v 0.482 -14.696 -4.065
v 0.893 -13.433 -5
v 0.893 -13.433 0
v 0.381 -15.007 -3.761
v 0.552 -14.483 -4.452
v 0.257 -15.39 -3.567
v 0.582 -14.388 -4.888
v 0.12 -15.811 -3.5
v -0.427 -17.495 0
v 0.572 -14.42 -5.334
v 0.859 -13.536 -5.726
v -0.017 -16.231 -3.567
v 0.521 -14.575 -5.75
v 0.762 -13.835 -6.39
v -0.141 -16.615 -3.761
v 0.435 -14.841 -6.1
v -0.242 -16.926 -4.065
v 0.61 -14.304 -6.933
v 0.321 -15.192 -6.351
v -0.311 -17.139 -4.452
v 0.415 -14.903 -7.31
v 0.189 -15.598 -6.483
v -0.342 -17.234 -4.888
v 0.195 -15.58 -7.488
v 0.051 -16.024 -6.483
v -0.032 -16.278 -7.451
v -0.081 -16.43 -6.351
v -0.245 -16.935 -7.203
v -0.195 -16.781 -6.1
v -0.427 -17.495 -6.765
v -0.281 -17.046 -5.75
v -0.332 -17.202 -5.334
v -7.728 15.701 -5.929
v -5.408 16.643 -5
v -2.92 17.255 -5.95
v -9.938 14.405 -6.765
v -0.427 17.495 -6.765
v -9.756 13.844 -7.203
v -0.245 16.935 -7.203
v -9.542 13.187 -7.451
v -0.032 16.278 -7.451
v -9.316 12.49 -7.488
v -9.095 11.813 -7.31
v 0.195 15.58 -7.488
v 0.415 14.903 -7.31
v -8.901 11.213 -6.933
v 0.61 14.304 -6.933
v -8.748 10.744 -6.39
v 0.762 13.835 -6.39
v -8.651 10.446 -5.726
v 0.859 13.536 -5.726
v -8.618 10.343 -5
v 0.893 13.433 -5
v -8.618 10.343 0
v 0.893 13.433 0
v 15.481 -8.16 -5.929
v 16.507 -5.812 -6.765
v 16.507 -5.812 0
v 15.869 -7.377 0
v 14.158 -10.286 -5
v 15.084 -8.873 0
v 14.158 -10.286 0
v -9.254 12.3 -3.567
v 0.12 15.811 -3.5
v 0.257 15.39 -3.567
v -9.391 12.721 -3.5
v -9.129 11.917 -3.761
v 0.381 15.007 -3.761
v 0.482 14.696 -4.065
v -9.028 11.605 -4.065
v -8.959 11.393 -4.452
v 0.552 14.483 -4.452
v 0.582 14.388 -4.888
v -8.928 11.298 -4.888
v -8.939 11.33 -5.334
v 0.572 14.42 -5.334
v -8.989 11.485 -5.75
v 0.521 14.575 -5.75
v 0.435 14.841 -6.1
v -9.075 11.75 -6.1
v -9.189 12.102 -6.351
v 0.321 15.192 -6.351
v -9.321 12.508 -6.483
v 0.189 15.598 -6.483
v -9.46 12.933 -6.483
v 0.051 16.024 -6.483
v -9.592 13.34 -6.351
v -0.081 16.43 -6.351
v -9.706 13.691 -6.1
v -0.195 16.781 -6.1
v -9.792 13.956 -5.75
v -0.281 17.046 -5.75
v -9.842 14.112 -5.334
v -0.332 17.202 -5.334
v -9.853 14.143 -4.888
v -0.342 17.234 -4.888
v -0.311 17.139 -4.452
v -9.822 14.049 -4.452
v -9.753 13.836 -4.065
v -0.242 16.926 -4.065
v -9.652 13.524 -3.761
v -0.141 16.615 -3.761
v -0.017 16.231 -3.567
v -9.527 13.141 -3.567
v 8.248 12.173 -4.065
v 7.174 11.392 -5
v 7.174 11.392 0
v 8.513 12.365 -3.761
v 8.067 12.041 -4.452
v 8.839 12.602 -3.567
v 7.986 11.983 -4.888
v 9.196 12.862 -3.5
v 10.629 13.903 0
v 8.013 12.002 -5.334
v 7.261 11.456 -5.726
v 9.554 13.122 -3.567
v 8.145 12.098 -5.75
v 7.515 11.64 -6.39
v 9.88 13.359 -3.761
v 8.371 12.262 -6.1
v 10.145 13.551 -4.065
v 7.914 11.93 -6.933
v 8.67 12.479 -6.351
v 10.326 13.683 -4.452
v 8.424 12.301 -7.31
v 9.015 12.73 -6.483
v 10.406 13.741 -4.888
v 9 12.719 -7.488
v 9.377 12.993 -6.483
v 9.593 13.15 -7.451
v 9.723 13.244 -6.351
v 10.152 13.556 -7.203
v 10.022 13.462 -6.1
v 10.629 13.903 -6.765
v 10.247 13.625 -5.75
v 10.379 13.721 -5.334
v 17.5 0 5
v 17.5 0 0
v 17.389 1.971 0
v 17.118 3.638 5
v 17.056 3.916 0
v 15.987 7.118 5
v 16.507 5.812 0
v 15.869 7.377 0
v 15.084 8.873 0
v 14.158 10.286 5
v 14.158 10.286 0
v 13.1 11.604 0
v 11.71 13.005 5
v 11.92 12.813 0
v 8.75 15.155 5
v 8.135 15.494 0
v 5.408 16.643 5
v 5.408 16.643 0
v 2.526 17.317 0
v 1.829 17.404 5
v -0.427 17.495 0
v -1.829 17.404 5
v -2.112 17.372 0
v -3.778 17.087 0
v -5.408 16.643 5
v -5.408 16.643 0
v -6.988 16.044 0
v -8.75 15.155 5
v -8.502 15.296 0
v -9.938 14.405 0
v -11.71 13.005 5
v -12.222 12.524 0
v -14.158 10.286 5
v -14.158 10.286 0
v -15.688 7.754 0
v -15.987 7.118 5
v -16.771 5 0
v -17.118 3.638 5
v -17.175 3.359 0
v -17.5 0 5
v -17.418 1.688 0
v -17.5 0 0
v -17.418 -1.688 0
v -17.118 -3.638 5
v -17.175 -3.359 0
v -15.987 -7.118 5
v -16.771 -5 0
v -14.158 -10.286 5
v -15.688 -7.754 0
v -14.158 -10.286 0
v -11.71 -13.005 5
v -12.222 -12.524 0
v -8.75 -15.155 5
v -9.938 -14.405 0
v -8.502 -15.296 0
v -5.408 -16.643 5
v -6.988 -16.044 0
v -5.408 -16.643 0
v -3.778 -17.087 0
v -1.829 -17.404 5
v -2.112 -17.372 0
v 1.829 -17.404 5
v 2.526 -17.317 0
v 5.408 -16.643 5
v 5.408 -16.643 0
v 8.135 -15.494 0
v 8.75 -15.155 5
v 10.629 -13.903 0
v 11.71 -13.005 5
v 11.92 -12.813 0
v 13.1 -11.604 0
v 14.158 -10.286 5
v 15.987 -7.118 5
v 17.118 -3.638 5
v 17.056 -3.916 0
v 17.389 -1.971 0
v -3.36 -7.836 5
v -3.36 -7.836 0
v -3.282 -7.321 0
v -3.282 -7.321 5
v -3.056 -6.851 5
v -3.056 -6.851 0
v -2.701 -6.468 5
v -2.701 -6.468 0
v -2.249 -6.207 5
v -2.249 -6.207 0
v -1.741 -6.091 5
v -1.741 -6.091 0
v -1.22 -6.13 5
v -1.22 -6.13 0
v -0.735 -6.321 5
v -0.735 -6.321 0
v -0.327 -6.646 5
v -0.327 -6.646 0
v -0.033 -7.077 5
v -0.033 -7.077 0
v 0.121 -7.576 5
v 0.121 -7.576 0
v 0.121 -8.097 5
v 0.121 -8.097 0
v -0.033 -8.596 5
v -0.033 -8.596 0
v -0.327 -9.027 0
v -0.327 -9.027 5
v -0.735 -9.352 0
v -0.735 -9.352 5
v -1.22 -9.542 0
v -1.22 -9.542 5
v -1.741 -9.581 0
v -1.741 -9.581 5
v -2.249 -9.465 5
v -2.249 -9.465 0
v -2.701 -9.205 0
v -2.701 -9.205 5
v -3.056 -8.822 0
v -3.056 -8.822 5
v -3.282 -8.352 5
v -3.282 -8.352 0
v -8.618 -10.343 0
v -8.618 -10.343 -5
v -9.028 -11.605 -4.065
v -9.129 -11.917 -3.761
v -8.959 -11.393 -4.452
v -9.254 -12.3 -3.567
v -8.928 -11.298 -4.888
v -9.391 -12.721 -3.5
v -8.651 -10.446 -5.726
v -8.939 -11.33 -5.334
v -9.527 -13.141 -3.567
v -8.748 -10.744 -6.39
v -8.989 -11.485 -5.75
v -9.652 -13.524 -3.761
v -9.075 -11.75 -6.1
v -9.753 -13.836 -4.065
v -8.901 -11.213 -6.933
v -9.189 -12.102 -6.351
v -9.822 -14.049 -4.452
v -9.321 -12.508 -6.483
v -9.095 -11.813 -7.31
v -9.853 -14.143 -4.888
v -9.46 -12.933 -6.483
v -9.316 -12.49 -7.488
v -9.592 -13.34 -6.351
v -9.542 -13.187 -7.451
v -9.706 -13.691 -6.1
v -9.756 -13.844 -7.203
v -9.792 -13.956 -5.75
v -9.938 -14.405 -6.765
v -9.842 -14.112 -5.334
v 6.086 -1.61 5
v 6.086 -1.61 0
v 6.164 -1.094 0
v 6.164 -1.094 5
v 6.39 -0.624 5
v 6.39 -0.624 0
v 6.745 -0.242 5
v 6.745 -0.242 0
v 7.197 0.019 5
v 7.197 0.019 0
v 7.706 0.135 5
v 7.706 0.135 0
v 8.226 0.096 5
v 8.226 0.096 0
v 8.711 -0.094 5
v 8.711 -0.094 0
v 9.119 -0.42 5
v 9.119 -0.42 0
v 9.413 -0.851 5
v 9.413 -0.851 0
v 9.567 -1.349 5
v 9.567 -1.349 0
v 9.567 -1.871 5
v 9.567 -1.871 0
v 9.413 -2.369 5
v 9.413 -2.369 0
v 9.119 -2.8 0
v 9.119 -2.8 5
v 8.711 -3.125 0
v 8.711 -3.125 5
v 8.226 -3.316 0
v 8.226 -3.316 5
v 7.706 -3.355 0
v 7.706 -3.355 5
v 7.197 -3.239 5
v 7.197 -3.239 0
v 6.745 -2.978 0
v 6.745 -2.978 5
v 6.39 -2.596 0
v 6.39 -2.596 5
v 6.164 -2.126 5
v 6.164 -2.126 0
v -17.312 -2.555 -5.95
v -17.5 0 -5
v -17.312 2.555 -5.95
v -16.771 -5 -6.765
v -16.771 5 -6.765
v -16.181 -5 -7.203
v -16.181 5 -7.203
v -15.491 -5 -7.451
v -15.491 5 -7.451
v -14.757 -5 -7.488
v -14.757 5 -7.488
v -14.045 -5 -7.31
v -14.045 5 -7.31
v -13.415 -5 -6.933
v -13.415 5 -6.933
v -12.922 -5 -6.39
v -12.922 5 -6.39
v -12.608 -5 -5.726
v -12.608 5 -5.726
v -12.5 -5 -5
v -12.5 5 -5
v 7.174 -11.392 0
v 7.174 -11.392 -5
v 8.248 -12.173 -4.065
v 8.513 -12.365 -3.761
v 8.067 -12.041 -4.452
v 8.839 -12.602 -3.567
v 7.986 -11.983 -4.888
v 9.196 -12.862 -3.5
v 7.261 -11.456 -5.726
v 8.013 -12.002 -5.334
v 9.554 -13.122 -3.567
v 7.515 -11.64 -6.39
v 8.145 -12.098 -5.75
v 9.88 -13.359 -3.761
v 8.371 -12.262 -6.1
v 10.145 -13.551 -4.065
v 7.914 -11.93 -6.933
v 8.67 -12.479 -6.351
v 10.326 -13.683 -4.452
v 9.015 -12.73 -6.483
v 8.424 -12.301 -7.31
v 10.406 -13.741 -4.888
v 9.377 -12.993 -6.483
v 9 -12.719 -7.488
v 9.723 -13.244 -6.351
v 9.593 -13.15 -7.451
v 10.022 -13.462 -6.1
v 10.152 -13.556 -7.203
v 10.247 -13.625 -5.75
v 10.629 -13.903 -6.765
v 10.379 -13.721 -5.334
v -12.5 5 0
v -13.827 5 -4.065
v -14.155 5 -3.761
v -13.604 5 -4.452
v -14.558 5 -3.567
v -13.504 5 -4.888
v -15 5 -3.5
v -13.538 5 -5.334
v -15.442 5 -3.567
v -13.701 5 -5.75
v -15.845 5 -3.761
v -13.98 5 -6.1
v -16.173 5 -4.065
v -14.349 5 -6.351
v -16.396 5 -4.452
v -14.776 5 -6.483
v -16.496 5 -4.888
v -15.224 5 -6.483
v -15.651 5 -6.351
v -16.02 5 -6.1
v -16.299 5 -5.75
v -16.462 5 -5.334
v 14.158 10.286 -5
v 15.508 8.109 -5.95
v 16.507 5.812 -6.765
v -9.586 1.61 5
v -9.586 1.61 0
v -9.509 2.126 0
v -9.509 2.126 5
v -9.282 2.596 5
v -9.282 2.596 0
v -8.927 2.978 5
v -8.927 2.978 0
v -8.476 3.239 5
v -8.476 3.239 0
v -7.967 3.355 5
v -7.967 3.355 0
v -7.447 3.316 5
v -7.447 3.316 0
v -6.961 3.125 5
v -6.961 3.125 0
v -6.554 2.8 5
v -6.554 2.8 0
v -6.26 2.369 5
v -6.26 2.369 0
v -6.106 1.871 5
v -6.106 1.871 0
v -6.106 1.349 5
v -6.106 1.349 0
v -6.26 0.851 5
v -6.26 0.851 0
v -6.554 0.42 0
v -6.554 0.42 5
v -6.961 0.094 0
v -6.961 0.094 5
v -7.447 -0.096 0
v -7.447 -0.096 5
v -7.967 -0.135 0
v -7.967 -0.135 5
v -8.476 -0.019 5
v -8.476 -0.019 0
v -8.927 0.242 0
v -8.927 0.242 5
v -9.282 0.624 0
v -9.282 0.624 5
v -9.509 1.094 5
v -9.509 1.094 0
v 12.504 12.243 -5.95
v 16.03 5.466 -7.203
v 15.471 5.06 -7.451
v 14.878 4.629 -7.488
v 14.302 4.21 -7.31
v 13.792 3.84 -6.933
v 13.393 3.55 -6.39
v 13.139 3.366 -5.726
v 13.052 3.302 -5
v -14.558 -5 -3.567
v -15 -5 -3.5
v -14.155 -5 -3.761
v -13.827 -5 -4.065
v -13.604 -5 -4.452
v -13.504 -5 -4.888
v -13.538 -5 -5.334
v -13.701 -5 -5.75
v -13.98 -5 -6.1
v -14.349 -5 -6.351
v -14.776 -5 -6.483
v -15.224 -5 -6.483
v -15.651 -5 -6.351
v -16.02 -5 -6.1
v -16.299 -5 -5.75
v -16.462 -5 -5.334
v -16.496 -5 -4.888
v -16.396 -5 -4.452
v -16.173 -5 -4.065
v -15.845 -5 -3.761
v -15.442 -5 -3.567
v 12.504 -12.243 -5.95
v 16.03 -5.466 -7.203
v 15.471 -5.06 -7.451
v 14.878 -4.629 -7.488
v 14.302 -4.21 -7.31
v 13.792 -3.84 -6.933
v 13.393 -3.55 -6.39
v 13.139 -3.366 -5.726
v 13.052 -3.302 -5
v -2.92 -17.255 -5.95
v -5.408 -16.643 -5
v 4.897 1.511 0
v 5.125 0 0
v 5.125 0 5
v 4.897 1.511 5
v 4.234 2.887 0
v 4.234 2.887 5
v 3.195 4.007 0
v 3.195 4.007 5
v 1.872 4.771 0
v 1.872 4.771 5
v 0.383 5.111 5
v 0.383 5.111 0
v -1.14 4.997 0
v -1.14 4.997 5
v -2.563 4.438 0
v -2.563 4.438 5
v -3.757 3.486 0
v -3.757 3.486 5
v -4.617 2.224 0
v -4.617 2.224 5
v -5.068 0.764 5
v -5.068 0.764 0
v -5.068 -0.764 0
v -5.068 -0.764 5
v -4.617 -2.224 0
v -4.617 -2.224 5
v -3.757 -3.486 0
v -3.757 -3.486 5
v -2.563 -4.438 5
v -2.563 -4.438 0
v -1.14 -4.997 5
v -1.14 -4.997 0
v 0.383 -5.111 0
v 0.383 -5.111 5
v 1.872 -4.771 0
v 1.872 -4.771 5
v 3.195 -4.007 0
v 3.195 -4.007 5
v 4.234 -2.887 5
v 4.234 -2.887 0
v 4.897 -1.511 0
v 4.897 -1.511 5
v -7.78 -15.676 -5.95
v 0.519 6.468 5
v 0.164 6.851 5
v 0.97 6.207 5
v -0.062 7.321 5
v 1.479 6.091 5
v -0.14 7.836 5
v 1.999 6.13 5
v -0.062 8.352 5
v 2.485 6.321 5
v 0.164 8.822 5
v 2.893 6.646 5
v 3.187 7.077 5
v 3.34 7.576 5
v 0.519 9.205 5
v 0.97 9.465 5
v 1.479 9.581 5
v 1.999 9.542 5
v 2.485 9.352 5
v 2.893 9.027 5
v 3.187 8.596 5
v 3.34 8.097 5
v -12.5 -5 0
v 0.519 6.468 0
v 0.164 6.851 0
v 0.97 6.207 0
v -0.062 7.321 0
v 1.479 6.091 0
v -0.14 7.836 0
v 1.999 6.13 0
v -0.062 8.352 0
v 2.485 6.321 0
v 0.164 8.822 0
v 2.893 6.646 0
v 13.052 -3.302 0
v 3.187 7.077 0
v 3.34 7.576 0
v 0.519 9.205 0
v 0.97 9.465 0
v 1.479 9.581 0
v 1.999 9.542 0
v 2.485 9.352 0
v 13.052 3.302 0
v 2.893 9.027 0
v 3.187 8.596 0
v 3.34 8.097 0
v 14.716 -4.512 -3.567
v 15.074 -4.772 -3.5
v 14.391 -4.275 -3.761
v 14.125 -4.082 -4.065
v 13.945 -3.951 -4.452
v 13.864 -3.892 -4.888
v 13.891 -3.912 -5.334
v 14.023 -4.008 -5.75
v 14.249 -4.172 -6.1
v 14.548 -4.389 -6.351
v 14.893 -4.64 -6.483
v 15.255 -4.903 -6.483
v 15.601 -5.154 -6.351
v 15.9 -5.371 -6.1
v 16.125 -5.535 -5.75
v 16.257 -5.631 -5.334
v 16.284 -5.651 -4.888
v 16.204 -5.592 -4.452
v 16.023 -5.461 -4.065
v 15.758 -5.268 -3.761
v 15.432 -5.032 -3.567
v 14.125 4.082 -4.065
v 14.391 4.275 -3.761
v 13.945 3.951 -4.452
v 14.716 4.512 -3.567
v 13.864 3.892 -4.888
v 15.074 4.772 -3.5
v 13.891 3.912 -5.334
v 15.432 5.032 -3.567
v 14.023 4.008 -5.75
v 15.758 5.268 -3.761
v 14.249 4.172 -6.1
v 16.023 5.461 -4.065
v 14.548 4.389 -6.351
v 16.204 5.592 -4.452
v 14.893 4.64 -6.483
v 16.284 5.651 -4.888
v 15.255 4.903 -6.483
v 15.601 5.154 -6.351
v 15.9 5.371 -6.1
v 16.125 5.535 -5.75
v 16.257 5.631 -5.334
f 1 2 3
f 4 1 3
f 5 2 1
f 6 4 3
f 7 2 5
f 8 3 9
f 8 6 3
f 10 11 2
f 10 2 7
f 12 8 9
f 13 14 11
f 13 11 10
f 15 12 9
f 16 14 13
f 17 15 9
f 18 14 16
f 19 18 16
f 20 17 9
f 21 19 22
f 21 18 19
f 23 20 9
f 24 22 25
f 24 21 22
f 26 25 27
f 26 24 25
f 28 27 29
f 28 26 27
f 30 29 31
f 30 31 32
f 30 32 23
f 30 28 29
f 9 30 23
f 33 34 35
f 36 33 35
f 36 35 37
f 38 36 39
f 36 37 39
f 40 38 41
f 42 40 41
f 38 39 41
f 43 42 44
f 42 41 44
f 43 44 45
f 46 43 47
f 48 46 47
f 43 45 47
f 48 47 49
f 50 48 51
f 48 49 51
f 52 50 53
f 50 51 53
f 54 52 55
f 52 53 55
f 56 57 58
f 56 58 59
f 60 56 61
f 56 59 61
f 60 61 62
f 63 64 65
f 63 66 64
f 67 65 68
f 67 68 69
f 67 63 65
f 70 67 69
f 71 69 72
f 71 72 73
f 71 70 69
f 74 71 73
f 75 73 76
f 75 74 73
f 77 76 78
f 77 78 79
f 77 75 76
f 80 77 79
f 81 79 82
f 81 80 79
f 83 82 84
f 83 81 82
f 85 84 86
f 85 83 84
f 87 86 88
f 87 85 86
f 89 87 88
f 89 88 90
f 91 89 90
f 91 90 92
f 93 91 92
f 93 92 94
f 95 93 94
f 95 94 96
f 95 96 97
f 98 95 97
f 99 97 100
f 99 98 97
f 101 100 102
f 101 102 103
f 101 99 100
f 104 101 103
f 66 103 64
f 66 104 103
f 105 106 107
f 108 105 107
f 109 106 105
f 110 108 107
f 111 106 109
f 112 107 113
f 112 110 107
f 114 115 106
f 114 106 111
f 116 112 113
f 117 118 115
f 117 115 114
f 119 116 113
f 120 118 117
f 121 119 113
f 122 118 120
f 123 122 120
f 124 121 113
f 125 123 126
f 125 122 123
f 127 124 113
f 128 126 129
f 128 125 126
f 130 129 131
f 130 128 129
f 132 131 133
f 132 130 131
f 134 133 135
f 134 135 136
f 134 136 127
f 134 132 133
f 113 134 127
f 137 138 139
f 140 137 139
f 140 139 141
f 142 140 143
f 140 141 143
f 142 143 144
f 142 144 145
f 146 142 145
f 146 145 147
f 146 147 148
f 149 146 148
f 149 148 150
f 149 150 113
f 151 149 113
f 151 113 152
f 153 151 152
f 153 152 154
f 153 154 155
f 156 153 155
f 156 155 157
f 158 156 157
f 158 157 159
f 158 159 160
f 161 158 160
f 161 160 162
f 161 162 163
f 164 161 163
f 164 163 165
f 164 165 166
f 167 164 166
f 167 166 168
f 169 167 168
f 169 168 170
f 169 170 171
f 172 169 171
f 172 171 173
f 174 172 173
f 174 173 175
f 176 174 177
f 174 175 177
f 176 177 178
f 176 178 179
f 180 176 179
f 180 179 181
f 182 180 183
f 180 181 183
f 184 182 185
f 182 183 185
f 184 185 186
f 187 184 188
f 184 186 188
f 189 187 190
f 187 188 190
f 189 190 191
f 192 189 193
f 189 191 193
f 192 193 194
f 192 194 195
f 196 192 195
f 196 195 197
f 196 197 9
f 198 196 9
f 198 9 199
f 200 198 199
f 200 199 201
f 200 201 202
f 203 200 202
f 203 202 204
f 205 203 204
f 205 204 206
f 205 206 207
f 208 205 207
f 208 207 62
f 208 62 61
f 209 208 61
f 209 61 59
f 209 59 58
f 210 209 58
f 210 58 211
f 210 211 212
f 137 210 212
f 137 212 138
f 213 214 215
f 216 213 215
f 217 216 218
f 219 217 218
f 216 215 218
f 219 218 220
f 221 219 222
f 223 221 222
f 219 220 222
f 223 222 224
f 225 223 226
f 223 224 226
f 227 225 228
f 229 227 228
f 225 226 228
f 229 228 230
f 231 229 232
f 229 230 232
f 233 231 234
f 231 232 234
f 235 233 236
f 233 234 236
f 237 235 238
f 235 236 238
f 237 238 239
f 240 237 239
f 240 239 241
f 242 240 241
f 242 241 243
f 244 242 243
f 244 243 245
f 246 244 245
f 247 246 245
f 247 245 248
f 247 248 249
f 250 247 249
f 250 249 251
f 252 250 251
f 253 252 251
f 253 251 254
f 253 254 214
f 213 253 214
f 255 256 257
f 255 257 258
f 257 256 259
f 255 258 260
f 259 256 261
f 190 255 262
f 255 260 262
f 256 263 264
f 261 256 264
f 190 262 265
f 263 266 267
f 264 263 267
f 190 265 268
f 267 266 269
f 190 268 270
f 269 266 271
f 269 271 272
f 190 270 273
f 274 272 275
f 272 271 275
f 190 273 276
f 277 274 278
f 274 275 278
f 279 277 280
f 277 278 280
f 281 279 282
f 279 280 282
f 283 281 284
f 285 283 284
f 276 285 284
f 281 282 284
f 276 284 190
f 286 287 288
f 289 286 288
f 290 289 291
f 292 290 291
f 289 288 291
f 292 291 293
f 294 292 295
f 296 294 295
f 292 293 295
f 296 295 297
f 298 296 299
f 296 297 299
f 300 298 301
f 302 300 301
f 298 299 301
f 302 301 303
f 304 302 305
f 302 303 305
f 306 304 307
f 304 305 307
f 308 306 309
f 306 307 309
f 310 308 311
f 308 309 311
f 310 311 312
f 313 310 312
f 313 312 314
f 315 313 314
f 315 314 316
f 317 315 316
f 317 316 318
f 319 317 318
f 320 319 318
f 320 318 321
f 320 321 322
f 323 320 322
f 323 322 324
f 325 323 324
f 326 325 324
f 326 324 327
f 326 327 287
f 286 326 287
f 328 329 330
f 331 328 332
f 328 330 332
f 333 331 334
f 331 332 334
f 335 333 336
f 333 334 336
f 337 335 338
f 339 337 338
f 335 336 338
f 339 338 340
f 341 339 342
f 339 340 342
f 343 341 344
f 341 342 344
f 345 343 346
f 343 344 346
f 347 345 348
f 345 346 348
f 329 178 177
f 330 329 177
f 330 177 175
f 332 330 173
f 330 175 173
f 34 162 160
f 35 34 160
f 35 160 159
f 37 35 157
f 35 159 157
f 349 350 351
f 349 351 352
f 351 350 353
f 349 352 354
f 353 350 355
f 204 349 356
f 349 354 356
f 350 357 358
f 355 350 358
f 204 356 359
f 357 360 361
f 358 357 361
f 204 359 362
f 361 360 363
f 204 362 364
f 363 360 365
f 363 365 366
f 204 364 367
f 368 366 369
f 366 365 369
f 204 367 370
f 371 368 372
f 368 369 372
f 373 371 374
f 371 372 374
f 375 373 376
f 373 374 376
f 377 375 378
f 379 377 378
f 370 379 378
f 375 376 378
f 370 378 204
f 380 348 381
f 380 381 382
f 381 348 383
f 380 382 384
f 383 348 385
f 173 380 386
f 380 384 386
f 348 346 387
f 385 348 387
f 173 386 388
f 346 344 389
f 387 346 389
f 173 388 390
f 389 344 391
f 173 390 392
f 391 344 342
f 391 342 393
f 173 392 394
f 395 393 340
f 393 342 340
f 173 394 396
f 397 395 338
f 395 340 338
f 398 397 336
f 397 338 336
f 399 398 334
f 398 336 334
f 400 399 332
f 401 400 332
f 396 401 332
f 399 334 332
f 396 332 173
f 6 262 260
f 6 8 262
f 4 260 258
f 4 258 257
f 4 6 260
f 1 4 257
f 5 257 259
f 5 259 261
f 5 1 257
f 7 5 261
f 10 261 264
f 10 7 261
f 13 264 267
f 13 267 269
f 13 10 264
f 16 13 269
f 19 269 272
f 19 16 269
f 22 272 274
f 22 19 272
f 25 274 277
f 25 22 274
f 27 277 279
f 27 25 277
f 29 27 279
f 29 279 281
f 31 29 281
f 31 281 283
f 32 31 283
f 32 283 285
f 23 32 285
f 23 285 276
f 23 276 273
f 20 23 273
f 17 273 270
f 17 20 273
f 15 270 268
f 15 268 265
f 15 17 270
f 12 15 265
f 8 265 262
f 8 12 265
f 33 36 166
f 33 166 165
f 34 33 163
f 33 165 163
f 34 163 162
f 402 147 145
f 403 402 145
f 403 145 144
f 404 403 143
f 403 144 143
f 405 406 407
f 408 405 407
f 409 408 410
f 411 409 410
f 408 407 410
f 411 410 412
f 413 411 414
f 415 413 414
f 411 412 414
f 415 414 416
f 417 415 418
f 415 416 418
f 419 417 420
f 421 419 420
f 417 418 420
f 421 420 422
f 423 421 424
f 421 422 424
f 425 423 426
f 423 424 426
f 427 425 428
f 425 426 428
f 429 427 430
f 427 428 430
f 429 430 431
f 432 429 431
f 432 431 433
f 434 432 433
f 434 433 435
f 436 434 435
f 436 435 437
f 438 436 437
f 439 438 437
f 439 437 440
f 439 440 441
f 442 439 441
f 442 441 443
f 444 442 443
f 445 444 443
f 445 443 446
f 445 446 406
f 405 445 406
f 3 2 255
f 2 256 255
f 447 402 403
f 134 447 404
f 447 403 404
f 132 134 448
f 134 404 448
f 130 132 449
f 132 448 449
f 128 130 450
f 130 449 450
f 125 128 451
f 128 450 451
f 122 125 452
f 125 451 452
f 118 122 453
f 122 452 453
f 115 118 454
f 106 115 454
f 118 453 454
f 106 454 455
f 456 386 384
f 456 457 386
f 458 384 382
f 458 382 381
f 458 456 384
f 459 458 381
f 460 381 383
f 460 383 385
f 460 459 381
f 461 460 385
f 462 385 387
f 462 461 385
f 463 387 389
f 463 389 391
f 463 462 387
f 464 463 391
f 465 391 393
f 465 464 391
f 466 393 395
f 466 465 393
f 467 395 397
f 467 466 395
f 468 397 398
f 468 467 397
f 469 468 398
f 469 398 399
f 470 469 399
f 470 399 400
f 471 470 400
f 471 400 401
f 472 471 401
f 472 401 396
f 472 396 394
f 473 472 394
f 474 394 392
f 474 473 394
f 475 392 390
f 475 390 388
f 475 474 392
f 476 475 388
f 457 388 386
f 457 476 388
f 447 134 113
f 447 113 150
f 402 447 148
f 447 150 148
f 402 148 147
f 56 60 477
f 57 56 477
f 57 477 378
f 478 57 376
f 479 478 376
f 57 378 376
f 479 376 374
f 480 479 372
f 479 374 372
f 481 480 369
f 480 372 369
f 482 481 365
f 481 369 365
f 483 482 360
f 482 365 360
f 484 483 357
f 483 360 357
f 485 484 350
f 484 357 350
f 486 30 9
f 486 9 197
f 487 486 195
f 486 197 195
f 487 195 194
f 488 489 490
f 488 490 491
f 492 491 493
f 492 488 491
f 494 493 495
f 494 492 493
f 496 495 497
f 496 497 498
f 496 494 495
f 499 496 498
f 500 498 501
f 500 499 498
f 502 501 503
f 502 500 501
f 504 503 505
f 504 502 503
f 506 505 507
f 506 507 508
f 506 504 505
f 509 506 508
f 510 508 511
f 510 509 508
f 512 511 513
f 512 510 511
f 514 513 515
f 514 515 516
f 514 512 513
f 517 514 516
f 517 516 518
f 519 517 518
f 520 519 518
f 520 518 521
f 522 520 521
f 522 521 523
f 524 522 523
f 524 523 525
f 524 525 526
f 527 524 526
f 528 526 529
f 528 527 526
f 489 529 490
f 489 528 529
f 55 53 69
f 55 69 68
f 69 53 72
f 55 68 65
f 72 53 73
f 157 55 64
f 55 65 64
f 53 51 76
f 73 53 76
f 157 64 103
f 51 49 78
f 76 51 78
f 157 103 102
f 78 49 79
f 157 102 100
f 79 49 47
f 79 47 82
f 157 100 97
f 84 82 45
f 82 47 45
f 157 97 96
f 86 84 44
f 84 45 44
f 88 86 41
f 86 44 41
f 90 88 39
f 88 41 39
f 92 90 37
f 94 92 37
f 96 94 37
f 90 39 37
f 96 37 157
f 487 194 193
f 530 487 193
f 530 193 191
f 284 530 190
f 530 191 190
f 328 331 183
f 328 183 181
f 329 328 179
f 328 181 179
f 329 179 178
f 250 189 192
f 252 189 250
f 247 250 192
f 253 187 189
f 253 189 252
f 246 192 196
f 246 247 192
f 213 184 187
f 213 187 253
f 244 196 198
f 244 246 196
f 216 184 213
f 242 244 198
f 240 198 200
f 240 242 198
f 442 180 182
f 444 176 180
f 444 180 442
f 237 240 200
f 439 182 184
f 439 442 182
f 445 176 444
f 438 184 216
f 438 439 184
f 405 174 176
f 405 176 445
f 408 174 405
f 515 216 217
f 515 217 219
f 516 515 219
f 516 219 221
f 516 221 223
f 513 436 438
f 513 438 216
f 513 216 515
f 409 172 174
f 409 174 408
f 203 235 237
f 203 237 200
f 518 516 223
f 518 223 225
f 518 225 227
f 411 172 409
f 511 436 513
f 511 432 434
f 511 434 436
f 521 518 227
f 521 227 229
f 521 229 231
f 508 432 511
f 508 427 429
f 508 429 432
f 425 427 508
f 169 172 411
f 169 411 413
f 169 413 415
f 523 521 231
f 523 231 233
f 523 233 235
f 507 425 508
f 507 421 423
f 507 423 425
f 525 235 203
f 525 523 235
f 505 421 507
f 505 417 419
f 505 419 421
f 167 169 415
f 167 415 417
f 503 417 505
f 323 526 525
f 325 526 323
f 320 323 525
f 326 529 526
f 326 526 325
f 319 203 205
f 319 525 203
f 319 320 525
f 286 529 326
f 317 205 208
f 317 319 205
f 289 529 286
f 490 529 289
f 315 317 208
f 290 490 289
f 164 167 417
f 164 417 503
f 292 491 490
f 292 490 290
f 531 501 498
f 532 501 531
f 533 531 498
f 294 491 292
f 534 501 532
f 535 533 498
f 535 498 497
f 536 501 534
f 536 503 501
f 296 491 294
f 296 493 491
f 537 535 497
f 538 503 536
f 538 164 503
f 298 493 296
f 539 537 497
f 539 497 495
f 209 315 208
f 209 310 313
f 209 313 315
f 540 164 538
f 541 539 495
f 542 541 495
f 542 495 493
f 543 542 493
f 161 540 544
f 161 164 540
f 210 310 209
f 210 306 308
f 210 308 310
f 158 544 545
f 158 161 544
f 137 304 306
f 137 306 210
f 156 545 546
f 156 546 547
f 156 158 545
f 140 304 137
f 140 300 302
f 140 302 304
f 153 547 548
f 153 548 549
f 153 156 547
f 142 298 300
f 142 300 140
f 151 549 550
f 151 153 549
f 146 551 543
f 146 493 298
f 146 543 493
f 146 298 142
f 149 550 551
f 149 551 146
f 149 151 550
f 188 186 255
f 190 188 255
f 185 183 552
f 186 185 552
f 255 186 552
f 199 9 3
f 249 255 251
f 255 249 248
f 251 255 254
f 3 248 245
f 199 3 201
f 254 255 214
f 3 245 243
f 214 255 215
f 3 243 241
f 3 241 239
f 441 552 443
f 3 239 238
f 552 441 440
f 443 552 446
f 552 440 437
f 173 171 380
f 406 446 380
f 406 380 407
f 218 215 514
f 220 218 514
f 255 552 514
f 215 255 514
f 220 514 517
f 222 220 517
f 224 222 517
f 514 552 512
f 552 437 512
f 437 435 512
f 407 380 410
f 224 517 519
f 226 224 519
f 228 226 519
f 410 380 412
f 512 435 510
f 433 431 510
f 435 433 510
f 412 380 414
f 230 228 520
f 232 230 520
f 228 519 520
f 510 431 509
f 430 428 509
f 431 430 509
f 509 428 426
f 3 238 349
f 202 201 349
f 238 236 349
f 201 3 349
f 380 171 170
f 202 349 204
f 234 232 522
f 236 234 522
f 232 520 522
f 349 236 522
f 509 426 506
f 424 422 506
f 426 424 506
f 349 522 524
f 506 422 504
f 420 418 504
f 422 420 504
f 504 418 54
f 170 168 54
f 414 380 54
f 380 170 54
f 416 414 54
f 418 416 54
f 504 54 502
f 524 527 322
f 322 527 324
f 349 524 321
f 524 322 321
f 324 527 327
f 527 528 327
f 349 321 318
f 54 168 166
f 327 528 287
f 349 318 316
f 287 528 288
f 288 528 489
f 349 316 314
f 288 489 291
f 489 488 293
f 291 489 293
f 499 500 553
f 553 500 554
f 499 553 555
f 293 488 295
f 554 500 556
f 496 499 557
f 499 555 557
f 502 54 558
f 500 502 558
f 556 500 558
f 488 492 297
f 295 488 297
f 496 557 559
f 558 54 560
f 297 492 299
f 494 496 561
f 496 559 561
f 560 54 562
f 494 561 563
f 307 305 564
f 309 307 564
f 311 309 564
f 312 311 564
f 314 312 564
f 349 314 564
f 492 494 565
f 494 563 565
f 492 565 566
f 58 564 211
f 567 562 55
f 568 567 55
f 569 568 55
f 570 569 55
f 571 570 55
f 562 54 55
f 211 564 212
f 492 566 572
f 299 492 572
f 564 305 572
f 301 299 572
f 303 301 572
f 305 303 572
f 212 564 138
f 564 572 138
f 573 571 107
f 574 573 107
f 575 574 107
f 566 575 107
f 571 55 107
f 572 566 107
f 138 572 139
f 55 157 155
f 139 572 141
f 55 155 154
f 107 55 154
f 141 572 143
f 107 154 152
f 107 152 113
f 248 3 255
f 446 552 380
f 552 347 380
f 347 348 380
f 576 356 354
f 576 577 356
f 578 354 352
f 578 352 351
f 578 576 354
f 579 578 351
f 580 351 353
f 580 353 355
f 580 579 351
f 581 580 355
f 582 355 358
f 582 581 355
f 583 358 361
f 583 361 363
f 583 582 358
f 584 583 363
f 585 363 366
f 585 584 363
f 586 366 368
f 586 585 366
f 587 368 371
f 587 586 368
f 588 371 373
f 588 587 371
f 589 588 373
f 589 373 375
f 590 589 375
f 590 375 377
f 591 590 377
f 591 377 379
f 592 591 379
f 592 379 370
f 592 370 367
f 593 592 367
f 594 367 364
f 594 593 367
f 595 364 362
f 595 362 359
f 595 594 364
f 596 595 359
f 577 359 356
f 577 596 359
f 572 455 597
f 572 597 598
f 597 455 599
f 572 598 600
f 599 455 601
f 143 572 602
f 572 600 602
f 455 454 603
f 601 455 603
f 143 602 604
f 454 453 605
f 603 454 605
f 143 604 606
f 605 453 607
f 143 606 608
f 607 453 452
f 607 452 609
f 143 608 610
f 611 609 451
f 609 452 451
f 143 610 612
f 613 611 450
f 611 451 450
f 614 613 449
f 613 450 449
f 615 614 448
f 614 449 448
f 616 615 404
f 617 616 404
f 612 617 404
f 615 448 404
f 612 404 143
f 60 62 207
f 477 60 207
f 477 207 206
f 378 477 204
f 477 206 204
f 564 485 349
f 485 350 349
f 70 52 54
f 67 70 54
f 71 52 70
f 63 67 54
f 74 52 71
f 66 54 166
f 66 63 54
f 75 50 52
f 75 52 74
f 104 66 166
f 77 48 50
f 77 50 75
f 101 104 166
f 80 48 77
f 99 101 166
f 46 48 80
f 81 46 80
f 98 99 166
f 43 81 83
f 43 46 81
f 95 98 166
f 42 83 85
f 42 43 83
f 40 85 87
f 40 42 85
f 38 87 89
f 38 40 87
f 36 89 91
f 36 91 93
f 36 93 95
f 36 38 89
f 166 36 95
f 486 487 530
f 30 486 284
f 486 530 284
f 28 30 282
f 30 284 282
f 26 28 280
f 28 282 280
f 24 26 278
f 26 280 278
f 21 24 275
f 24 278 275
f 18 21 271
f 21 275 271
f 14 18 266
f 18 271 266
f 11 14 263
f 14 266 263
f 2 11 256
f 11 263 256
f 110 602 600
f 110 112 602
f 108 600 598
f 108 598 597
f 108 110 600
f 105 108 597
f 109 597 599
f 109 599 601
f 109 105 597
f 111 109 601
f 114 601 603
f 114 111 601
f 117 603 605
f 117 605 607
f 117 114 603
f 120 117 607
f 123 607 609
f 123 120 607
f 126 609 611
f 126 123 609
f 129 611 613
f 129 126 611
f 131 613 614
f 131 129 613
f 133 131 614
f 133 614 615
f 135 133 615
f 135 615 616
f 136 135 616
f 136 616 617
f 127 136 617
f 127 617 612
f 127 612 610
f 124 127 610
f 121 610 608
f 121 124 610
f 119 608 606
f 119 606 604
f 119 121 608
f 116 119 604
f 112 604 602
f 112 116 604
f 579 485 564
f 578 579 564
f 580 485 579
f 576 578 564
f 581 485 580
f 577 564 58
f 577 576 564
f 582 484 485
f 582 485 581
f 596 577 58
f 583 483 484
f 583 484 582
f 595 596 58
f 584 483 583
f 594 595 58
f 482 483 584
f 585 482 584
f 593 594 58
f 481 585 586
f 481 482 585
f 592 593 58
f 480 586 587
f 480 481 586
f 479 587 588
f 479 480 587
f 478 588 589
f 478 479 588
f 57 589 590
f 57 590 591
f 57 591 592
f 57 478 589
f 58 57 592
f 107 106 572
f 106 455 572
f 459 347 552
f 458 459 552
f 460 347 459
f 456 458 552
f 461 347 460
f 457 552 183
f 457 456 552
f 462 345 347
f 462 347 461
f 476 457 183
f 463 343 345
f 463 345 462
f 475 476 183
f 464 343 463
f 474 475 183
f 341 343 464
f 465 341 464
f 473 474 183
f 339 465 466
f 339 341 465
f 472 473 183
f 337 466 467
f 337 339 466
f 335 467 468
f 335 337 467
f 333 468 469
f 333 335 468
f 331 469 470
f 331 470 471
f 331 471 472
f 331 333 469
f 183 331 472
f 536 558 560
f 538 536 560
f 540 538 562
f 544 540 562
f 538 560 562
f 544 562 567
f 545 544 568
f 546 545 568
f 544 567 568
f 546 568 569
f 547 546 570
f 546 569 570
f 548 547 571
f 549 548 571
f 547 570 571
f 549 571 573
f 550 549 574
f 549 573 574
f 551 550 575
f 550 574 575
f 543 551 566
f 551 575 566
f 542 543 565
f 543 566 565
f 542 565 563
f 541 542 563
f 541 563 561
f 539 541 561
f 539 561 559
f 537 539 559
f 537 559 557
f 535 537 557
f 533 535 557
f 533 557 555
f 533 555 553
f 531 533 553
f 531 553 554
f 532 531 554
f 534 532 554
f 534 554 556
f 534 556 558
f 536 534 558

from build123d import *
from build123d.topology import SkipClean

# Parameters (mm, degrees)
ESQUISSE1_R                  = 17.5
ESQUISSE1_R_2                = 5.125
BOSS_EXTRU_1_DEPTH           = 5
ESQUISSE2_R                  = 1.5
BOSS_EXTRU_2_DEPTH           = 5
ENL_V_MAT_EXTRU_1_DEPTH      = 26.860201082
R_P_TITION_CIRCULAIRE1_COUNT = 5
ESQUISSE4_R                  = 1.75
ENL_V_MAT_EXTRU_2_DEPTH      = 10


with BuildPart() as part:
    # Esquisse1 → Boss.-Extru.1 (new body)
    with BuildSketch(Plane.XY):
        Circle(ESQUISSE1_R)
        Circle(ESQUISSE1_R_2, mode=Mode.SUBTRACT)
    extrude(amount=BOSS_EXTRU_1_DEPTH)

    # Esquisse2 → Boss.-Extru.2 (add, symmetric)
    with BuildSketch(Plane(origin=(0, 0, 0), x_dir=(1, 0, 0), z_dir=(0, 1, 0))):
        with BuildLine():
            Line((-17.5, 0), (-17.5, 5))
            ThreePointArc((-17.5, 5), (-15, 7.5), (-12.5, 5))
            Line((-12.5, 5), (-12.5, 0))
            Line((-12.5, 0), (-17.5, 0))
        make_face()
        with Locations((-15, 5)):
            Circle(ESQUISSE2_R, mode=Mode.SUBTRACT)
    boss_extru_2 = extrude(amount=BOSS_EXTRU_2_DEPTH, both=True)

    # Esquisse3 → Enlèv. mat.-Extru.1 (cut, through all)
    with SkipClean():  # the faces are left unmerged after this step: merging them gives an invalid solid
        with BuildSketch(Plane.XY):
            with BuildLine():
                ThreePointArc((-16.770509831, -5), (-17.316667145, -2.526467688), (-17.5, 0))
                Line((-17.5, 0), (-17.5, -5))
                Line((-17.5, -5), (-16.770509831, -5))
            make_face()
            with BuildLine():
                Line((-17.5, 5), (-17.5, 0))
                ThreePointArc((-17.5, 0), (-17.316667145, 2.526467688), (-16.770509831, 5))
                Line((-16.770509831, 5), (-17.5, 5))
            make_face()
        enl_v_mat_extru_1 = extrude(amount=-ENL_V_MAT_EXTRU_1_DEPTH, mode=Mode.SUBTRACT)

    # Répétition circulaire1: Boss.-Extru.2, Enlèv. mat.-Extru.1 ×5 about axis
    with SkipClean():  # the faces are left unmerged after this step: merging them gives an invalid solid
        r_p_tition_circulaire1_axis = Axis((0, 0, 0), (0, 0, 1))
        add([boss_extru_2.rotate(r_p_tition_circulaire1_axis, i * 360 / R_P_TITION_CIRCULAIRE1_COUNT) for i in range(1, R_P_TITION_CIRCULAIRE1_COUNT)])
        add([enl_v_mat_extru_1.rotate(r_p_tition_circulaire1_axis, i * 360 / R_P_TITION_CIRCULAIRE1_COUNT) for i in range(1, R_P_TITION_CIRCULAIRE1_COUNT)], mode=Mode.SUBTRACT)

    # Esquisse4 → Enlèv. mat.-Extru.2 (cut)
    with SkipClean():  # the faces are left unmerged after this step: merging them gives an invalid solid
        with BuildSketch(Plane(origin=(0, 0, 0), x_dir=(-1, 0, 0), z_dir=(0, 0, -1))):
            with Locations((-7.836351046, -1.609845421)):
                Circle(ESQUISSE4_R)
            with Locations((1.609845421, -7.836351046)):
                Circle(ESQUISSE4_R)
            with Locations((7.836351046, 1.609845421)):
                Circle(ESQUISSE4_R)
            with Locations((-1.609845421, 7.836351046)):
                Circle(ESQUISSE4_R)
        extrude(amount=-ENL_V_MAT_EXTRU_2_DEPTH, mode=Mode.SUBTRACT)


solid = part.part
